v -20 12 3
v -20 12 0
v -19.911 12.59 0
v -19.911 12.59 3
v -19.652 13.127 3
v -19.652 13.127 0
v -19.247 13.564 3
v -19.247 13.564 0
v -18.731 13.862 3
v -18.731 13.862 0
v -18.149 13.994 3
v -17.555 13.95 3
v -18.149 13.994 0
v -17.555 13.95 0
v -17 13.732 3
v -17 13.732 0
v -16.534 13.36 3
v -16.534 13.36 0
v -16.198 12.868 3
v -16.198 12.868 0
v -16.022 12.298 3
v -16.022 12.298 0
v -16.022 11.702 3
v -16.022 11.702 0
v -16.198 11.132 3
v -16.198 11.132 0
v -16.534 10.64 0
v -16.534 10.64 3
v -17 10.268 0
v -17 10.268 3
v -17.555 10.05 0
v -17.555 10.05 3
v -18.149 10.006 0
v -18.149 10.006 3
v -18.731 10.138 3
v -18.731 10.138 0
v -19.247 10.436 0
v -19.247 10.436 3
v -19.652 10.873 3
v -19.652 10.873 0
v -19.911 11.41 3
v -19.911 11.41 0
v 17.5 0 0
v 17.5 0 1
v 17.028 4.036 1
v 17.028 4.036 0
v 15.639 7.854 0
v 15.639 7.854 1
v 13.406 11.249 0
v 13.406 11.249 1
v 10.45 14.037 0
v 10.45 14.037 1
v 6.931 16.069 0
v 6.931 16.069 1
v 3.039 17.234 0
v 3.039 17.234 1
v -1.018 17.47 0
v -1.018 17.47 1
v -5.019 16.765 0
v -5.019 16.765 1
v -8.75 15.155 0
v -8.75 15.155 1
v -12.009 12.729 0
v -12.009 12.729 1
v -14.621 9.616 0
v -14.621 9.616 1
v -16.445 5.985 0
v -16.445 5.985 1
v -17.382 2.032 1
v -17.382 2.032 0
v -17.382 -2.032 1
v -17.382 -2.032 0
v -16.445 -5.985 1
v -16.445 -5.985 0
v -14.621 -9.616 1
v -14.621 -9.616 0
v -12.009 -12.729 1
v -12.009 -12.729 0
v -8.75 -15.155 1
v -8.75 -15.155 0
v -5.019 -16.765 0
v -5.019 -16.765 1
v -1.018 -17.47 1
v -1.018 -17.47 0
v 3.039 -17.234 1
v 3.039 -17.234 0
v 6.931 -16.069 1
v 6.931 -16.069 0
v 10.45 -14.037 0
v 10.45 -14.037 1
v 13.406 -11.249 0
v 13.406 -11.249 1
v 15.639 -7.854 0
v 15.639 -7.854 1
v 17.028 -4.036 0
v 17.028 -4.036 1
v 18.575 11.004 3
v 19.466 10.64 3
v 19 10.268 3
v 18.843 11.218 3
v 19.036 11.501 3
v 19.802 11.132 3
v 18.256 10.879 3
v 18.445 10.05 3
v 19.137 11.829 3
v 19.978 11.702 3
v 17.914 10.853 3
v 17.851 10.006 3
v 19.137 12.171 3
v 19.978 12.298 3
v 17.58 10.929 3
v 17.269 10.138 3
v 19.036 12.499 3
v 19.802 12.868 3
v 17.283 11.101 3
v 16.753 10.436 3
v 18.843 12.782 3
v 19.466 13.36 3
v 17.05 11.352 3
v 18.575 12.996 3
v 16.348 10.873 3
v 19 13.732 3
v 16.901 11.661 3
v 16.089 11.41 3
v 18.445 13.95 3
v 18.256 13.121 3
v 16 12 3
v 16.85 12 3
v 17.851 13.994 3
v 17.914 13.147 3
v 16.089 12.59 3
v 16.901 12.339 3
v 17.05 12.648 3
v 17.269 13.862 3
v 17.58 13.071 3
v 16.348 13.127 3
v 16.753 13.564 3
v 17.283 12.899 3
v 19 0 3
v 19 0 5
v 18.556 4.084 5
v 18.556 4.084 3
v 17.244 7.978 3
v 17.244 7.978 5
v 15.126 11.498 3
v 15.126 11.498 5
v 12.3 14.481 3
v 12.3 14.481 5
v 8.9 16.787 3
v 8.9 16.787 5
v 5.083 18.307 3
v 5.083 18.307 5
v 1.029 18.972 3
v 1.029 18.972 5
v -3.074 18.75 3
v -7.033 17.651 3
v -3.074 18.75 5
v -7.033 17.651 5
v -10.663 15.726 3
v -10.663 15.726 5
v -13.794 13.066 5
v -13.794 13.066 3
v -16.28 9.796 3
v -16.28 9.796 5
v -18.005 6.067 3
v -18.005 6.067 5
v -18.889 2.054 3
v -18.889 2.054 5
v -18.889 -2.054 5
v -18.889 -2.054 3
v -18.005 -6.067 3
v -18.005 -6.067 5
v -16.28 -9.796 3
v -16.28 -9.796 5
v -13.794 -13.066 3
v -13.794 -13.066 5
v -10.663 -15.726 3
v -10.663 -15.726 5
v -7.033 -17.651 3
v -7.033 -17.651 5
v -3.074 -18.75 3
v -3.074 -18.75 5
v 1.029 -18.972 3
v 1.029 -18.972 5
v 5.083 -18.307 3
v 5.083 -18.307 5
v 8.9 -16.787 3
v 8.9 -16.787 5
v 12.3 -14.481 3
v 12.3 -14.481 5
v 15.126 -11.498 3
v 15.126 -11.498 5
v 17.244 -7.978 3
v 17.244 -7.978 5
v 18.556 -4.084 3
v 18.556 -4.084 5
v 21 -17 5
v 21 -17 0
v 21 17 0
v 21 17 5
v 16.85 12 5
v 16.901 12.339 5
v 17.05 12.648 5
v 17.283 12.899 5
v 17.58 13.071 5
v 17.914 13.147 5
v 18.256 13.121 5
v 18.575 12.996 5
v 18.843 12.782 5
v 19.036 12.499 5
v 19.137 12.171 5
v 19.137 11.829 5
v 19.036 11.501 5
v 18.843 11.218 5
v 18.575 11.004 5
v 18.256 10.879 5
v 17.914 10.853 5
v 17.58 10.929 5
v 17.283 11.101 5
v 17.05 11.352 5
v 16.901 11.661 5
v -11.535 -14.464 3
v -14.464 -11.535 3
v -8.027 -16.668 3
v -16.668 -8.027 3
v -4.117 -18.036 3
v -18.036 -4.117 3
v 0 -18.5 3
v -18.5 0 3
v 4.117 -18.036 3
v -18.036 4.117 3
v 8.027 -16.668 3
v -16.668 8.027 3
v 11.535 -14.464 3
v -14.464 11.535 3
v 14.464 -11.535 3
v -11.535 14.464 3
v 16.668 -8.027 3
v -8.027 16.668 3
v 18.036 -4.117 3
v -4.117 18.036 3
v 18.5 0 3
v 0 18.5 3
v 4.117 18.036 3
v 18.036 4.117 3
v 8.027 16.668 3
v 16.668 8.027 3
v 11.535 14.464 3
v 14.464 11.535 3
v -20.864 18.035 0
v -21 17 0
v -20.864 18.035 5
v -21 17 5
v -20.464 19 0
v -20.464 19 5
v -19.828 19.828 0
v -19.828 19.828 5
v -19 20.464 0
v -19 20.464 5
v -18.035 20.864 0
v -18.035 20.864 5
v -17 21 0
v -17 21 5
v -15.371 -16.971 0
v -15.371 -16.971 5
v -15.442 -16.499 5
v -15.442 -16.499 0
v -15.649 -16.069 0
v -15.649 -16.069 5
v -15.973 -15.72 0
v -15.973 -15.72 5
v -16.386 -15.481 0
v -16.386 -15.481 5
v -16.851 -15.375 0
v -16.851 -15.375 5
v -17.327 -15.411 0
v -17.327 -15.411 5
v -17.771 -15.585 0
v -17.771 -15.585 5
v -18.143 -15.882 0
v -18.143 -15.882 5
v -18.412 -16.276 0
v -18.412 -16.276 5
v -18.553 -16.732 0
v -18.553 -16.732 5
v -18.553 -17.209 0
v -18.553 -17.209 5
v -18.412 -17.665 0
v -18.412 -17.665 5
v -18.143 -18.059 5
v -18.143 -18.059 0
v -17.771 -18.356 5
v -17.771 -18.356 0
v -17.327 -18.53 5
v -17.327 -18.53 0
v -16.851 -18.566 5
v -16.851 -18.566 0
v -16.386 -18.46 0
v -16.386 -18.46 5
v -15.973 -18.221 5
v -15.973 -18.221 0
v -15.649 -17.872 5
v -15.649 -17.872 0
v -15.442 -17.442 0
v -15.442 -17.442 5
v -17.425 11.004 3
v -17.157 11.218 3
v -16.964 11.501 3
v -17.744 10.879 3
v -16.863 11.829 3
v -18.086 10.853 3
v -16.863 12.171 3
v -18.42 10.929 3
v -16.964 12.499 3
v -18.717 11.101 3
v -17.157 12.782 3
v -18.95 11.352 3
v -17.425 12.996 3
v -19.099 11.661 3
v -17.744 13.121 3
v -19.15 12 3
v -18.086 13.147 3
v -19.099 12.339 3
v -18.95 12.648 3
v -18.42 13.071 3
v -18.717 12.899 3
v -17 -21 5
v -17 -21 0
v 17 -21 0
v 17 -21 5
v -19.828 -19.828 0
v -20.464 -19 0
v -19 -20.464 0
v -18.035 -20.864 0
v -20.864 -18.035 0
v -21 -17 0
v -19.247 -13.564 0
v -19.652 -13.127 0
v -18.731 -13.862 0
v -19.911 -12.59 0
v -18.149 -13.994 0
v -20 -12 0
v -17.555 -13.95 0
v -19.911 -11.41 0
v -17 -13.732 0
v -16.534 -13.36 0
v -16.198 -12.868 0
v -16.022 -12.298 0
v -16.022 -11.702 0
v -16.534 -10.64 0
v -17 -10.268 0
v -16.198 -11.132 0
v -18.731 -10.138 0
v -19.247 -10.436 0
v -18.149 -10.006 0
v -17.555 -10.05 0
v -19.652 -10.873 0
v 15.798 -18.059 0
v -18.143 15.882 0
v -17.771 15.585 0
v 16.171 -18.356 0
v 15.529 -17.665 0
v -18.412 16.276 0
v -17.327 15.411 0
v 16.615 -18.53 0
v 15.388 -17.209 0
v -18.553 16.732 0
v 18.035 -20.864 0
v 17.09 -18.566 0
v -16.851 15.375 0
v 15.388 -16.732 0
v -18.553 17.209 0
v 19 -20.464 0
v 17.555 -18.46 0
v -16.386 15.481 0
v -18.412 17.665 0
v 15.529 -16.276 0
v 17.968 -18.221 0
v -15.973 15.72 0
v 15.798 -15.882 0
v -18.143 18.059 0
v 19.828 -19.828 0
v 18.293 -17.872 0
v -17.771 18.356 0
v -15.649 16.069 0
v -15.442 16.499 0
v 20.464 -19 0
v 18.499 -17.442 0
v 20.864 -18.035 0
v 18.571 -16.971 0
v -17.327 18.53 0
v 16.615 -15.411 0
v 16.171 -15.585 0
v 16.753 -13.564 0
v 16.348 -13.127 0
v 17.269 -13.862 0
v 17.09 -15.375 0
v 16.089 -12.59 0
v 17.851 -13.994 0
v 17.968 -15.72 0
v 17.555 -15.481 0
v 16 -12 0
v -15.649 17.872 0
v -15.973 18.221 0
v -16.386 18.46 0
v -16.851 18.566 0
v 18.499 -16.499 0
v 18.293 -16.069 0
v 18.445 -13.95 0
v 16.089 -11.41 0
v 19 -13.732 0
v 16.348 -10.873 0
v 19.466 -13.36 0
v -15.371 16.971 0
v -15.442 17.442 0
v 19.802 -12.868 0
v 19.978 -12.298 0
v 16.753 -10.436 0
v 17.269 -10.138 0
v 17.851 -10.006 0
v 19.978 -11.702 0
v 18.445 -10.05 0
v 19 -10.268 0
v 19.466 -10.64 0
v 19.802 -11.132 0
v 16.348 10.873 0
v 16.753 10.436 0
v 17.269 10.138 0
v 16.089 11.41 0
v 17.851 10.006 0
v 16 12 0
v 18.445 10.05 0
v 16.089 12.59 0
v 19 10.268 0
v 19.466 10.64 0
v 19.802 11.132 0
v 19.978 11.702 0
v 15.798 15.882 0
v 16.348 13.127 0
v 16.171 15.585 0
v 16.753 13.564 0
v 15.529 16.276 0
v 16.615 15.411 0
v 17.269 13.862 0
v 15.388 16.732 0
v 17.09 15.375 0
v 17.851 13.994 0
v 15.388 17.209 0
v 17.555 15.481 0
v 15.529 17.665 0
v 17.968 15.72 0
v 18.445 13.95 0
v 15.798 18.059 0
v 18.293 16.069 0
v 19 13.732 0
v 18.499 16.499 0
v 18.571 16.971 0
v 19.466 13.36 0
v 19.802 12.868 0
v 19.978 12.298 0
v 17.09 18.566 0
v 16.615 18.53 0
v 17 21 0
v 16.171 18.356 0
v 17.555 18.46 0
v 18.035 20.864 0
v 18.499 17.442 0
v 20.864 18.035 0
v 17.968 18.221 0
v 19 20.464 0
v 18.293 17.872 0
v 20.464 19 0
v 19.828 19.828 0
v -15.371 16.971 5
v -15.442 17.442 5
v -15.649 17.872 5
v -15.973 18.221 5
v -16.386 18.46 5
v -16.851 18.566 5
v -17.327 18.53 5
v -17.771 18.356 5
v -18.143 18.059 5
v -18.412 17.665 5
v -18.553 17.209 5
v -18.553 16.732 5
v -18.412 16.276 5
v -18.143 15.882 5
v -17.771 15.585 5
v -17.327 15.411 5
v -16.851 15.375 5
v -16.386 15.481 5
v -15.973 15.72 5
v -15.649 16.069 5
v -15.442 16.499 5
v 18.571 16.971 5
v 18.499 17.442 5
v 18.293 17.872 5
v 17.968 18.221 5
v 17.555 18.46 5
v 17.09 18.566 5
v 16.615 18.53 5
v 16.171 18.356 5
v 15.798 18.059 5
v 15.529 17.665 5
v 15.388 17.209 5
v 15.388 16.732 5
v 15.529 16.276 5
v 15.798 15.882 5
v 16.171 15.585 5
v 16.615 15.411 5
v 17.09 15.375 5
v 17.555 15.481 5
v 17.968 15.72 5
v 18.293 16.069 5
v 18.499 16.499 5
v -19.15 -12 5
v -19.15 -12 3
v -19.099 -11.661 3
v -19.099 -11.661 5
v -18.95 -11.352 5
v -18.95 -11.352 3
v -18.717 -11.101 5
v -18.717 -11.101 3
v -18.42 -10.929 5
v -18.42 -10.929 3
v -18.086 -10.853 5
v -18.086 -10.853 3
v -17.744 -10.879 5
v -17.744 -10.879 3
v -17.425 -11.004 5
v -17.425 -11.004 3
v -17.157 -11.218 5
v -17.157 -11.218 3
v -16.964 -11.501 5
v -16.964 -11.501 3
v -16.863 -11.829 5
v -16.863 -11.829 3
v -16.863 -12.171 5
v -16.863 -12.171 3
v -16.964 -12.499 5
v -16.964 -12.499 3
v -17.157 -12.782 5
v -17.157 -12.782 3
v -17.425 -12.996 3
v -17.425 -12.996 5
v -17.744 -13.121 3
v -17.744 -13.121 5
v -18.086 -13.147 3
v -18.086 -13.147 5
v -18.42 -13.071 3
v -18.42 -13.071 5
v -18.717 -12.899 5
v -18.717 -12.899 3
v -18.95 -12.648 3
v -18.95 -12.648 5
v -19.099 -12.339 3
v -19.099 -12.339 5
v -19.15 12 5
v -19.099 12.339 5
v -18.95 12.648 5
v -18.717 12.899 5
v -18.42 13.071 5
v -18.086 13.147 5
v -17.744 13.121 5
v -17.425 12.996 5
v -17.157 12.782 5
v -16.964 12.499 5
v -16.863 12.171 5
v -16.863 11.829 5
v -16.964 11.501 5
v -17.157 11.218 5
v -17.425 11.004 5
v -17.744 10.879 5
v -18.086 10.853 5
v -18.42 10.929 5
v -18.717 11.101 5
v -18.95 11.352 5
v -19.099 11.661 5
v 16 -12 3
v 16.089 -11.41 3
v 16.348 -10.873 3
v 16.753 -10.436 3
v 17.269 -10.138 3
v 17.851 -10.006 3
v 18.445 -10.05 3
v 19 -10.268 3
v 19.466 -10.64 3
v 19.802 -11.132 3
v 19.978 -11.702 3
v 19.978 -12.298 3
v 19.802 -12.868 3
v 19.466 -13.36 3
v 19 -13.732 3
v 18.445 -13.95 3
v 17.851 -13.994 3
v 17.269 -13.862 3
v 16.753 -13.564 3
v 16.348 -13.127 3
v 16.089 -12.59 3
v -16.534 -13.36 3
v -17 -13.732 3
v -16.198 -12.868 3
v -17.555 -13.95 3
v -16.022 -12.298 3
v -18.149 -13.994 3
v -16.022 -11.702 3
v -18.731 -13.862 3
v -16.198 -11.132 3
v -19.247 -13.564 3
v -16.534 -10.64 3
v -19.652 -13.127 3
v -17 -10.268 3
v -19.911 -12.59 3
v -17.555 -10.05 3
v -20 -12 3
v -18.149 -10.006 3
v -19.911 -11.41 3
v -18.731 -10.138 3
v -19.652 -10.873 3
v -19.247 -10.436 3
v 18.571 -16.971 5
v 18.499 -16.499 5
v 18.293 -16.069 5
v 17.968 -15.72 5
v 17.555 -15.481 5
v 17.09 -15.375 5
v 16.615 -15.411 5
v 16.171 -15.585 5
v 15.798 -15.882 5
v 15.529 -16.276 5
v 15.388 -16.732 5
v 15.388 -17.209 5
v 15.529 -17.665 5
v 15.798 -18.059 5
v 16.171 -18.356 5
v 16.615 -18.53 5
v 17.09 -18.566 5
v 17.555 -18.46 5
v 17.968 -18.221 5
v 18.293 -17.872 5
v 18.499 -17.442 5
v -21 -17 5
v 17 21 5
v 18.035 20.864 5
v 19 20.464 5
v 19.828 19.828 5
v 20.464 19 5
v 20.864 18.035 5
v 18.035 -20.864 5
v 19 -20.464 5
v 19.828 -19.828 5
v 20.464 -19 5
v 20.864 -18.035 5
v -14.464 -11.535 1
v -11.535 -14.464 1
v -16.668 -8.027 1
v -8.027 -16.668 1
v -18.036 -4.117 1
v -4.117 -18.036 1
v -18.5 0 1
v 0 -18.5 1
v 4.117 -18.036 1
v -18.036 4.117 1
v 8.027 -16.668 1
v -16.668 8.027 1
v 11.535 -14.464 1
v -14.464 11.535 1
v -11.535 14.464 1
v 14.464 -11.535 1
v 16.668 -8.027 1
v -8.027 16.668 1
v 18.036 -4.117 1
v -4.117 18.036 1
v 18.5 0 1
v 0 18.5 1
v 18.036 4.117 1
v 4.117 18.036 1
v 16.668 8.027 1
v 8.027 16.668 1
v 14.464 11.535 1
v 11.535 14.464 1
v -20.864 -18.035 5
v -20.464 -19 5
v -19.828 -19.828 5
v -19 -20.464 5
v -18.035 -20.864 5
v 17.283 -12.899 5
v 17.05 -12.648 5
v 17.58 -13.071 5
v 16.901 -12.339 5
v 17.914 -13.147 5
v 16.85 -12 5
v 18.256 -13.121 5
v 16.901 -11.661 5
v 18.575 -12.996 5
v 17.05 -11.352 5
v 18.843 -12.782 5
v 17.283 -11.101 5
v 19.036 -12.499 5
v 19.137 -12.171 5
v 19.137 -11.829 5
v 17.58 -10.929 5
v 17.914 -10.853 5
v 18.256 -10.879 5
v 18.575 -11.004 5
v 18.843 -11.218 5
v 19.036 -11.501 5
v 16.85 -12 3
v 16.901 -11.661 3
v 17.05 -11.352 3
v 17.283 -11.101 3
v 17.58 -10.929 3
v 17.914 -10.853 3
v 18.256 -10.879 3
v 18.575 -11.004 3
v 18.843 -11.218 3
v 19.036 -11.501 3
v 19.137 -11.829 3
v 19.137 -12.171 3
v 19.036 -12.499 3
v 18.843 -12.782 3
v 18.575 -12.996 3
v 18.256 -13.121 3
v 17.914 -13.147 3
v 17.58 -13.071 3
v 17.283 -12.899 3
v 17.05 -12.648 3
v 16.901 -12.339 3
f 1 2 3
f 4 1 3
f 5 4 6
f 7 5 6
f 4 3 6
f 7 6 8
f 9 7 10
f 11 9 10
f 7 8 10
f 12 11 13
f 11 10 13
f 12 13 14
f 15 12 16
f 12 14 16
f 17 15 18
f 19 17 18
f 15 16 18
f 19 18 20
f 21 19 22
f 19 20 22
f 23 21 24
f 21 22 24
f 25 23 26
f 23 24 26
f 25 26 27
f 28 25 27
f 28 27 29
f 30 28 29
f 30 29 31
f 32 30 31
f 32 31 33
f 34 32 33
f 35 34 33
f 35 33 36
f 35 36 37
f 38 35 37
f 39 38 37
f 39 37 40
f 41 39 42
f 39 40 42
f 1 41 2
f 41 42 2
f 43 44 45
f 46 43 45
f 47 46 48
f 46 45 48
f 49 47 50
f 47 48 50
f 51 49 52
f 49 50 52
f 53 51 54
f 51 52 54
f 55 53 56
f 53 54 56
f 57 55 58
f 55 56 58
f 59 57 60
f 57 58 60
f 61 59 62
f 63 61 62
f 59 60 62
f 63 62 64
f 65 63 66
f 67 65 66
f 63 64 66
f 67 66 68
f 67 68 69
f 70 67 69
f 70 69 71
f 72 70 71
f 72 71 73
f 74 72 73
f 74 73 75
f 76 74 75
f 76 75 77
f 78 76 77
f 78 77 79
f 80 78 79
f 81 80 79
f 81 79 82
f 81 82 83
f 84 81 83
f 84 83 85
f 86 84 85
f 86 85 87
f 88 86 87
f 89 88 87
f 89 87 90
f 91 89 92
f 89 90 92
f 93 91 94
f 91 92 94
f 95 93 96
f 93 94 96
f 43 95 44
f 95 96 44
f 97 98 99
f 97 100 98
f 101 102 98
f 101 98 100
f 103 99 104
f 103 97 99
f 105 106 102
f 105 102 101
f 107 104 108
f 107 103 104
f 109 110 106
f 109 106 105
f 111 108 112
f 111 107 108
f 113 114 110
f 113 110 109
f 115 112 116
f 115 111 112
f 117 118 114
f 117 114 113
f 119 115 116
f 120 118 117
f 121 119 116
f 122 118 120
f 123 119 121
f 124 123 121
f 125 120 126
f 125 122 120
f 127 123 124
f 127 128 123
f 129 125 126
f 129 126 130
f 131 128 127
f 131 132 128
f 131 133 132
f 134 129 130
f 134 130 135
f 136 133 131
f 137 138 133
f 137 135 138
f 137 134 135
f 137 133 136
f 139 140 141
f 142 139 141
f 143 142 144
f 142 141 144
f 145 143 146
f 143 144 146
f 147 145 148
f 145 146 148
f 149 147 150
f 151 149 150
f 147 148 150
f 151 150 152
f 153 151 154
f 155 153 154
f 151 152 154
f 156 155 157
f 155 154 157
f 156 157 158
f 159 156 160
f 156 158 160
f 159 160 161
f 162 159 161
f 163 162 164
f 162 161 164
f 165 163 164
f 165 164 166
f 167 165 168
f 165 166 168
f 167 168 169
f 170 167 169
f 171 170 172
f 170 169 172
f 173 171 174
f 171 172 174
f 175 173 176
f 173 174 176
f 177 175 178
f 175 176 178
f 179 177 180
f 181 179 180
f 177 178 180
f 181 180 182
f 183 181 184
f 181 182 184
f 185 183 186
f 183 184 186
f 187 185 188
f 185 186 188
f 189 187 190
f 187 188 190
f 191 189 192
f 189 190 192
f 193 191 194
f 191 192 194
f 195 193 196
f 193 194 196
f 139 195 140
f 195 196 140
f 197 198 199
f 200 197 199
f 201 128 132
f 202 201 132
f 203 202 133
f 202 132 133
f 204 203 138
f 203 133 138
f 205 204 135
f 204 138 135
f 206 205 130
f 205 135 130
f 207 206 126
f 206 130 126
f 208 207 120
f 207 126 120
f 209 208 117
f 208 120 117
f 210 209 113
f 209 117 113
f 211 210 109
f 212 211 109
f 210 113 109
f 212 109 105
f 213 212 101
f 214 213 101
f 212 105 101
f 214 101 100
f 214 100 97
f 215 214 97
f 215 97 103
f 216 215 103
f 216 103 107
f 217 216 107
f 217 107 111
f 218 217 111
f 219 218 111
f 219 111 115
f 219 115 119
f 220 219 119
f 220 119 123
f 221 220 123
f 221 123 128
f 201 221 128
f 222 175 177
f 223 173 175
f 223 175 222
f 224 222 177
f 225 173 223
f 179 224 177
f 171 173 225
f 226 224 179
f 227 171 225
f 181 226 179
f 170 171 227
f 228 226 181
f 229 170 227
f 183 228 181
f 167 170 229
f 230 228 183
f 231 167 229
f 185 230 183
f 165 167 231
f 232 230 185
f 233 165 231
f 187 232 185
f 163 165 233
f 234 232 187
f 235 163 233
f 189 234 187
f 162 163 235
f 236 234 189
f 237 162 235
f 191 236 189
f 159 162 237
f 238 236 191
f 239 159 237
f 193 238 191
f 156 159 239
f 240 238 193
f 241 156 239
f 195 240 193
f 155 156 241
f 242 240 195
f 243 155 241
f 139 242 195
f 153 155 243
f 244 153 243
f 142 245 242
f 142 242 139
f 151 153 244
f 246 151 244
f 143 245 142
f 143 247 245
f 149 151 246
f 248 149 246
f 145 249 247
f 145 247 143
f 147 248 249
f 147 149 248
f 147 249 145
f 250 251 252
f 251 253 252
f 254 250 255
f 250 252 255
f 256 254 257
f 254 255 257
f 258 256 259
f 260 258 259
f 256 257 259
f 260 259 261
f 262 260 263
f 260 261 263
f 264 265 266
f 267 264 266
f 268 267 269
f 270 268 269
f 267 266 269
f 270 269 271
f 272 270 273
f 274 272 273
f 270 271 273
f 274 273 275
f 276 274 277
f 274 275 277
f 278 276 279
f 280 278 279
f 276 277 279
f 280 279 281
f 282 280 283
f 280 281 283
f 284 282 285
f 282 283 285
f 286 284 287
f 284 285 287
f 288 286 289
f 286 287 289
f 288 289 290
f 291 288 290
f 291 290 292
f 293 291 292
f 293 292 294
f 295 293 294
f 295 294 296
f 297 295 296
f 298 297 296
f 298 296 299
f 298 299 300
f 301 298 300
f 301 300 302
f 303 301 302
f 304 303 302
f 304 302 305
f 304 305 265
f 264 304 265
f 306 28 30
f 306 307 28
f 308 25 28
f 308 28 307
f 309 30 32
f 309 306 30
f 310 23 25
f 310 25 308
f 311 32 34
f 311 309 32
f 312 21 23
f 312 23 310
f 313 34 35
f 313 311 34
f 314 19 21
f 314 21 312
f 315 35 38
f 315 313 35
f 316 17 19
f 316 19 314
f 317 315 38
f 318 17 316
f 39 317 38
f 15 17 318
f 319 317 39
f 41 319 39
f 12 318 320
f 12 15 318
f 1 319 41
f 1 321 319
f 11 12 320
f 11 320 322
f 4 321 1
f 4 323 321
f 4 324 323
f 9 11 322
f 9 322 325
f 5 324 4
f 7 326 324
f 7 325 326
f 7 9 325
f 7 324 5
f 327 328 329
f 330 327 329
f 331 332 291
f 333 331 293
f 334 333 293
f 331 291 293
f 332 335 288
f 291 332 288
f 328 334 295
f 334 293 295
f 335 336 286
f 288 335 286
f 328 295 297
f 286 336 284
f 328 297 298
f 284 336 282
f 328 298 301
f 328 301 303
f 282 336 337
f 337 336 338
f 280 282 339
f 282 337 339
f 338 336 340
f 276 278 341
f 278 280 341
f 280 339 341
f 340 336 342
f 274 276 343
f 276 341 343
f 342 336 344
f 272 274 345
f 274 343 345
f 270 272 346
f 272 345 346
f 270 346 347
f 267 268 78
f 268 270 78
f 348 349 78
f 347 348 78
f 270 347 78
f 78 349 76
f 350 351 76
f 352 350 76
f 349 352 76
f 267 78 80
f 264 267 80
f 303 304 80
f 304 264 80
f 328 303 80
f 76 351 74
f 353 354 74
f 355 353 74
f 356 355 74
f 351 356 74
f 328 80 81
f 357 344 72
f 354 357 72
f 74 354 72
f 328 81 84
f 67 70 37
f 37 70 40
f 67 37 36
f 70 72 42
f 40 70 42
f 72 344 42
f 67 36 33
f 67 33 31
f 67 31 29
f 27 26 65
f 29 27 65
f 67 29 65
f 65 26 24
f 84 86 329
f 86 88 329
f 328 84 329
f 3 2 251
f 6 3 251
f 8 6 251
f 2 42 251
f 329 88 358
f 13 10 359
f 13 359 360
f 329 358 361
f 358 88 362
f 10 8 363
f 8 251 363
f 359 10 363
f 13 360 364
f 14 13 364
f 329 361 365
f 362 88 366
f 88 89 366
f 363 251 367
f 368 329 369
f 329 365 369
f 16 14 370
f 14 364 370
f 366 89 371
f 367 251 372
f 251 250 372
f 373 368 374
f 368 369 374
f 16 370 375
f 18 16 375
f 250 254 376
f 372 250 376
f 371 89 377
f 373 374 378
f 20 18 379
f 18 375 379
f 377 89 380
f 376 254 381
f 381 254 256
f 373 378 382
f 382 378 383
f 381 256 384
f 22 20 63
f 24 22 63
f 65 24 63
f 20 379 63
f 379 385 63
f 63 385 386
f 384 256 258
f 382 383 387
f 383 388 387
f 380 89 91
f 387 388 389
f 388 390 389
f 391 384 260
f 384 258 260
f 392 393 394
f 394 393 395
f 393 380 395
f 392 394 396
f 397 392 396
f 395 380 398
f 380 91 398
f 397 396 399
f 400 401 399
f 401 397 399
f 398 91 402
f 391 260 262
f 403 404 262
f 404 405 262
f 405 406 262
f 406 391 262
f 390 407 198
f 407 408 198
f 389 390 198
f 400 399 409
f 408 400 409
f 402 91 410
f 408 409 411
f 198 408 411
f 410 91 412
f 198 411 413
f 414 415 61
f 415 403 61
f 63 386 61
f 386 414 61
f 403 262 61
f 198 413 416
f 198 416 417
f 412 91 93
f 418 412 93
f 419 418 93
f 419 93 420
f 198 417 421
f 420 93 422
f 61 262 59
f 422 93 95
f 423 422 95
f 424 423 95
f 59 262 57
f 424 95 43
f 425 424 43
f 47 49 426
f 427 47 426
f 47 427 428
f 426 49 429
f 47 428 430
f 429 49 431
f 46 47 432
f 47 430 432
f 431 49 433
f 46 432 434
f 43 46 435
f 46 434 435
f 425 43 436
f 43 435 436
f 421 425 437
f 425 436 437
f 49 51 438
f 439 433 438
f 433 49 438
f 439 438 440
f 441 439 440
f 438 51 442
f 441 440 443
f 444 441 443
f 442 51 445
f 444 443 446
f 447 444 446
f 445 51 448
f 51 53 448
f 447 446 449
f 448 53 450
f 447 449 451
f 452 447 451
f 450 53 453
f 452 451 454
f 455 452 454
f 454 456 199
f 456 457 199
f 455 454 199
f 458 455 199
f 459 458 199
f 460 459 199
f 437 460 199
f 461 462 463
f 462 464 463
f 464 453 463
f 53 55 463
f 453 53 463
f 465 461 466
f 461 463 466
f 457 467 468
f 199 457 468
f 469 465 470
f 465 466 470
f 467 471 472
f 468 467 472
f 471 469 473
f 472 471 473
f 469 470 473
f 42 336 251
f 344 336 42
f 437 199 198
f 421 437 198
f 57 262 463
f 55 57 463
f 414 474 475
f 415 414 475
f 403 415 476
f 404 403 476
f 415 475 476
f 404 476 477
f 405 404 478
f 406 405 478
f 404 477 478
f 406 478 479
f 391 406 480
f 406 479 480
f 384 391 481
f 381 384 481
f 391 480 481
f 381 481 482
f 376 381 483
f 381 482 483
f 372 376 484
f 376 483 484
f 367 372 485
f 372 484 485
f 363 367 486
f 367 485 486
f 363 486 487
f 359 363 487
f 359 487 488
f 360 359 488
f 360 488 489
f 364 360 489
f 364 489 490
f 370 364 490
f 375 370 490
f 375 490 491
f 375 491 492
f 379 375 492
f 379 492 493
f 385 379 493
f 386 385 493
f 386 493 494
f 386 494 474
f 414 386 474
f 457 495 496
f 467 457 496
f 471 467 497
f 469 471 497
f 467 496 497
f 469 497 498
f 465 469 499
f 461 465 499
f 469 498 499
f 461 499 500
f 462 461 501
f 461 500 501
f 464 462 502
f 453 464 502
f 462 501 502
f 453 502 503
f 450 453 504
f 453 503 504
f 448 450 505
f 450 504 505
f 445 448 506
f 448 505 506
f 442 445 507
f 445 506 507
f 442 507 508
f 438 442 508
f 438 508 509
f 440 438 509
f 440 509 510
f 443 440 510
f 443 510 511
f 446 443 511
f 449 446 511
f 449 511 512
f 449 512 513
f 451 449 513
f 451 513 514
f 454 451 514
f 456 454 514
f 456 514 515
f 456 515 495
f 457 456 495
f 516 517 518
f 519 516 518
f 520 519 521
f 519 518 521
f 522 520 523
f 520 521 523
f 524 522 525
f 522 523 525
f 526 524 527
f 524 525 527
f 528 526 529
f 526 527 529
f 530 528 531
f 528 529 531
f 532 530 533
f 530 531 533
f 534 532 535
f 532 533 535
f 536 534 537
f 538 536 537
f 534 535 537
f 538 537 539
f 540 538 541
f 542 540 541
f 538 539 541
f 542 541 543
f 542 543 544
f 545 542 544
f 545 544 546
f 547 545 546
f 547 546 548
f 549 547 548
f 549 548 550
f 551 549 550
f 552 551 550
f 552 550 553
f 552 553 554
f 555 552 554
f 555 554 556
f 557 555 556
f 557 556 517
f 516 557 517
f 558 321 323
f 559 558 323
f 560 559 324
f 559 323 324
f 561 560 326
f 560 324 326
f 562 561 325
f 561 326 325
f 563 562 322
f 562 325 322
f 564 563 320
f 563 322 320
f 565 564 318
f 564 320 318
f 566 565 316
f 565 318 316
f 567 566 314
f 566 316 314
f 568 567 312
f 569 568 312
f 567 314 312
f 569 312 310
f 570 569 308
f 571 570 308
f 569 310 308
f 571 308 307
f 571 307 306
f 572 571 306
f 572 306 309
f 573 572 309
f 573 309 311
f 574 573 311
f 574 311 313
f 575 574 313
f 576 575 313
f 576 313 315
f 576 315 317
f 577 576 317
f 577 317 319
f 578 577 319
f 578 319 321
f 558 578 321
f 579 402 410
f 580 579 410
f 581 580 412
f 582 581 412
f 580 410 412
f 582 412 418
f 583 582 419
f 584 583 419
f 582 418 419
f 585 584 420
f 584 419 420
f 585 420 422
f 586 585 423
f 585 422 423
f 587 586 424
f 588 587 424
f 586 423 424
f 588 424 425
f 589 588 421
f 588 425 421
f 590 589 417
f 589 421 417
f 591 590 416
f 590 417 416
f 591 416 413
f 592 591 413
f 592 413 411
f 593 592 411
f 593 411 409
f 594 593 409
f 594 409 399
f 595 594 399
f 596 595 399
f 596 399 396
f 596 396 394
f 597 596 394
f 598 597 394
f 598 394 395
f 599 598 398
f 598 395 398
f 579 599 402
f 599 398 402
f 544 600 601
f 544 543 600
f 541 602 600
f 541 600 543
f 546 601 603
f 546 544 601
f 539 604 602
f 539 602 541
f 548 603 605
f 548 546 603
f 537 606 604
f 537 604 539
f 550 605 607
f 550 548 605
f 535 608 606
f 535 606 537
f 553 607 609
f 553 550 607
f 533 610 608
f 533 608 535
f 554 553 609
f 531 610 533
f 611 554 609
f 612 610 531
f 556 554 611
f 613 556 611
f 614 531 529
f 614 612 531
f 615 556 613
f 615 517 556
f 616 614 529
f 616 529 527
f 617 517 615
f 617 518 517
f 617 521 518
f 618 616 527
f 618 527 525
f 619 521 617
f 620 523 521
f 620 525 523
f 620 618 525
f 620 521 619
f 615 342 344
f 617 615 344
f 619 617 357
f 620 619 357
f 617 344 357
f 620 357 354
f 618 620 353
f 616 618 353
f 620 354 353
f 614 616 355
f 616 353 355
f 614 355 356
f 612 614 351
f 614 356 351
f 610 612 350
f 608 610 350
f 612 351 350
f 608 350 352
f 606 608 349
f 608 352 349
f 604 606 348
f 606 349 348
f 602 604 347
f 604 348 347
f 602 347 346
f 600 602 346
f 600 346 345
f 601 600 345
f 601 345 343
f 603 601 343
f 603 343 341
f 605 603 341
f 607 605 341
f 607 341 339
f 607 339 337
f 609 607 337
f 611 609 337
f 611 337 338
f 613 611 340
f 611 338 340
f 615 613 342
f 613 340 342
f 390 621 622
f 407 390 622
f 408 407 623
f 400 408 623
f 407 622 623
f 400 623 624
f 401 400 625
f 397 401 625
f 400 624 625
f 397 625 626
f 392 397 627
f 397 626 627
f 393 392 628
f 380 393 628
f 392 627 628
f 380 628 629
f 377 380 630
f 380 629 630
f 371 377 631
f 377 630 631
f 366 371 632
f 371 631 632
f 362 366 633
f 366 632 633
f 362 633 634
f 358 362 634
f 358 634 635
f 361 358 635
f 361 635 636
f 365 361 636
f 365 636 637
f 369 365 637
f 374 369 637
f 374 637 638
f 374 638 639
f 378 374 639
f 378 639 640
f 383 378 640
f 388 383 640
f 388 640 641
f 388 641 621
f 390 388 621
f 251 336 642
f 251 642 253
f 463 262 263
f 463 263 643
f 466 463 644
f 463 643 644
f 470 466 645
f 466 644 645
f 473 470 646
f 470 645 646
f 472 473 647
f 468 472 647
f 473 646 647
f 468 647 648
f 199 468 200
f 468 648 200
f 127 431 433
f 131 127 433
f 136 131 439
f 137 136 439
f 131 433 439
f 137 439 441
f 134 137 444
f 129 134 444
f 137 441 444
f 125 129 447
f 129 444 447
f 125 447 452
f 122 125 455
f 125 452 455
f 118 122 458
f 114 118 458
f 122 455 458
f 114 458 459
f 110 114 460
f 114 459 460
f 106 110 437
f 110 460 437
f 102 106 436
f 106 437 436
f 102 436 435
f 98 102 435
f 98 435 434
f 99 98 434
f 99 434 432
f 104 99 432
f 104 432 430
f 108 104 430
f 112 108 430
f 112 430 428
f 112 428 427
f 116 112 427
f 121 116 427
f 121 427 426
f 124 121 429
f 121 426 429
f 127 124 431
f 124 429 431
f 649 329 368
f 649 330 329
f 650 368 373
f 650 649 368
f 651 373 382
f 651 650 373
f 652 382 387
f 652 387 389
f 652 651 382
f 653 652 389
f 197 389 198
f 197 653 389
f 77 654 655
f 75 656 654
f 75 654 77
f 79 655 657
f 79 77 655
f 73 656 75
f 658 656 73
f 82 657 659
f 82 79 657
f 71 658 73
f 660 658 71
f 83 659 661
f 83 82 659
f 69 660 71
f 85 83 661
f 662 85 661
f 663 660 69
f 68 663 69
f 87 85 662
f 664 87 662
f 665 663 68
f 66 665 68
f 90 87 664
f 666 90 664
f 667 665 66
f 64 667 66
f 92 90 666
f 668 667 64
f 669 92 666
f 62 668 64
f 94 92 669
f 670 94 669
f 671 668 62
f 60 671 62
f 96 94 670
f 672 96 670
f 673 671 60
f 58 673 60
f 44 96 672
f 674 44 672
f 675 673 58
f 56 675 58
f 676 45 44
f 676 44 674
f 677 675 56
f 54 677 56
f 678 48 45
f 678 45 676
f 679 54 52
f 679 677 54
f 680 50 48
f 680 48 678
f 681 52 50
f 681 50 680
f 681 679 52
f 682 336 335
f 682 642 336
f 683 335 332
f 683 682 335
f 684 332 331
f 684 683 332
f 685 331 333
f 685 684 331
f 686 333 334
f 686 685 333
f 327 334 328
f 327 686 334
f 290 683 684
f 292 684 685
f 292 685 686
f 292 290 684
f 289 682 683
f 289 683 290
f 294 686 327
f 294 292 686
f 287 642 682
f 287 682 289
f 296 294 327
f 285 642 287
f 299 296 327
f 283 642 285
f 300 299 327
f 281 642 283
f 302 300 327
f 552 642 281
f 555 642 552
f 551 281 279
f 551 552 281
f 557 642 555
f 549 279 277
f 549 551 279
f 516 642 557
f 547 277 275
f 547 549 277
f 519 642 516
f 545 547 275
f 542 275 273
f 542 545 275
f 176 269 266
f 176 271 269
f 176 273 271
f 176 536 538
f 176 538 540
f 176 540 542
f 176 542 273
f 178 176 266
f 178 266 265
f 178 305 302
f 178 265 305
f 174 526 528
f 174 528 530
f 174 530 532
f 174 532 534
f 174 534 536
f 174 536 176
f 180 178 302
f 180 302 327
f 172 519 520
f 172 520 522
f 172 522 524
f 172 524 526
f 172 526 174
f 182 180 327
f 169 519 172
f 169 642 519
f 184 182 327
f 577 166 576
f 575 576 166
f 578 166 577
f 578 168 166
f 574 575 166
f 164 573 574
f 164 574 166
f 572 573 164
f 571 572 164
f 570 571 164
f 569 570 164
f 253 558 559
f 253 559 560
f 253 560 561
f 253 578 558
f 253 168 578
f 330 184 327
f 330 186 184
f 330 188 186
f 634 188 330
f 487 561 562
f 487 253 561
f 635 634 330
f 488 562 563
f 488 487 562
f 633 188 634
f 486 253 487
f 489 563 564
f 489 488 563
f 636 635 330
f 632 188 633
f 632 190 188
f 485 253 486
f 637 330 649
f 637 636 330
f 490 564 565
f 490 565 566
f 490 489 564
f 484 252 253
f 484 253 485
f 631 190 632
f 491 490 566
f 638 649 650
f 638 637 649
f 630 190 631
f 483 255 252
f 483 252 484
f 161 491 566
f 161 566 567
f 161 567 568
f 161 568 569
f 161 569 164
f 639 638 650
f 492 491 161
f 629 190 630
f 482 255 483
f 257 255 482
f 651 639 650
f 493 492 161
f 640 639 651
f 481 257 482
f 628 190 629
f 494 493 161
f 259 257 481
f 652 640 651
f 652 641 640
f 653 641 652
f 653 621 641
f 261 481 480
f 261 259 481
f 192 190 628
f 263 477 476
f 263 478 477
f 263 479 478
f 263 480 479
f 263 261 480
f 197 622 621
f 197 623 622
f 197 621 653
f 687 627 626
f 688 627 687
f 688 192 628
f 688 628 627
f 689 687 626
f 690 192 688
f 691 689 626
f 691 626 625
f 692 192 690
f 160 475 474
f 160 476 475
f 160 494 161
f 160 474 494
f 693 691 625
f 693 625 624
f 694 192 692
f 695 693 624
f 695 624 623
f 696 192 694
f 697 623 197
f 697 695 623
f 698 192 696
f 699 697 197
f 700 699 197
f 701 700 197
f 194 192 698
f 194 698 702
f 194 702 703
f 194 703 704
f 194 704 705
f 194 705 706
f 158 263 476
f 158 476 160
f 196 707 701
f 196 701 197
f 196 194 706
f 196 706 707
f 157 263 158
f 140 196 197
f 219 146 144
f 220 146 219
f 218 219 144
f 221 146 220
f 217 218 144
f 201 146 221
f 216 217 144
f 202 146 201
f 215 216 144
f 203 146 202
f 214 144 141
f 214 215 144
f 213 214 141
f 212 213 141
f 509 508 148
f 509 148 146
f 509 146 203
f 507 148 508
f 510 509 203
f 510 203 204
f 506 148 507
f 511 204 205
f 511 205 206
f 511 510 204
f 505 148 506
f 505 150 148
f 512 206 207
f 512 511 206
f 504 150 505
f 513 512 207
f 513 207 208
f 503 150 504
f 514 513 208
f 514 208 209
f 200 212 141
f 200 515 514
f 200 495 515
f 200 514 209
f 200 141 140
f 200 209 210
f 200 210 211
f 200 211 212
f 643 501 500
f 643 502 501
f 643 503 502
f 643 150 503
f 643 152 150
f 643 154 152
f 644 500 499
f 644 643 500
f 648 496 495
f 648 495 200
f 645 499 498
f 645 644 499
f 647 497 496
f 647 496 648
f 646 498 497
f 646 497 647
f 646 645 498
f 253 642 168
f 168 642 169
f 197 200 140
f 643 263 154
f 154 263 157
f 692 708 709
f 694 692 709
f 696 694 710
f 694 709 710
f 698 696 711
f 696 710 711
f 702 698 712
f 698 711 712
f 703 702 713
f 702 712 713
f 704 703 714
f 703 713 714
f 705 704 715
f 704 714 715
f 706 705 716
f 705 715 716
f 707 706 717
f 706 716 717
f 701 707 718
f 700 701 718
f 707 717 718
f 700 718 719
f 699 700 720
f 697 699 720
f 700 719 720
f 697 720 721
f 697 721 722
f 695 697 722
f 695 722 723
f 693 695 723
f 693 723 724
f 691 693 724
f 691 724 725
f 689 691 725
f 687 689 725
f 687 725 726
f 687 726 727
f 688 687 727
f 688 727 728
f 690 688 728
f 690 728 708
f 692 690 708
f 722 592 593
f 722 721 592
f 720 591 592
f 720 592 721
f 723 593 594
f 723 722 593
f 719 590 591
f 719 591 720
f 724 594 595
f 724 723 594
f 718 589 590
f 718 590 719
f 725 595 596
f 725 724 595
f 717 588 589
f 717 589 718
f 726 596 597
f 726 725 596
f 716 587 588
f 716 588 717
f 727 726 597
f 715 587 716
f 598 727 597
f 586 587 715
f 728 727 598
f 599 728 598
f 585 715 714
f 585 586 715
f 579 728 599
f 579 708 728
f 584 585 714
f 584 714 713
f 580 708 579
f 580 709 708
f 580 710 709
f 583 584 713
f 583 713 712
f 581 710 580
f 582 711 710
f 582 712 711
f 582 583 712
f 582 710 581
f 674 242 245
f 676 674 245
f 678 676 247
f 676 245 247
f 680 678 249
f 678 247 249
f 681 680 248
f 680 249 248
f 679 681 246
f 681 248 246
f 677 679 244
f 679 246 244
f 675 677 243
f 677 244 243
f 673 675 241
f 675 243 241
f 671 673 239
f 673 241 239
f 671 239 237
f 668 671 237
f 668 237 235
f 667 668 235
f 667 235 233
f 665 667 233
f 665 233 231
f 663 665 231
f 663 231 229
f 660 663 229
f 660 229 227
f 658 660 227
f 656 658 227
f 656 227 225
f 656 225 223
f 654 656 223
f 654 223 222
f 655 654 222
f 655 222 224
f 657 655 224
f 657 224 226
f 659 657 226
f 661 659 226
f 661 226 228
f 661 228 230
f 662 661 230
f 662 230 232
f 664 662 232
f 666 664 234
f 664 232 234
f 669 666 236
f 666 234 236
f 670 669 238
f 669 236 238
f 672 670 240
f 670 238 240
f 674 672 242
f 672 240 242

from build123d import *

# Parameters (mm, degrees)
SKETCH_1_W          = 42
SKETCH_1_H          = 42
EXTRUDE_1_DEPTH     = 5
SKETCH_2_R          = 17.5
CUT_EXTRUDE_1_DEPTH = 6
SKETCH_3_R          = 18.5
CUT_EXTRUDE_2_DEPTH = 4
SKETCH_4_R          = 19
CUT_EXTRUDE_3_DEPTH = 2
FILLET_1_R          = 4
SKETCH_5_R          = 1.6
CUT_EXTRUDE_4_DEPTH = 6
SKETCH_7_R          = 1.15
CUT_EXTRUDE_5_DEPTH = 6
SKETCH_8_R          = 2
CUT_EXTRUDE_6_DEPTH = 3


with BuildPart() as part:
    # 草图1 → 凸台-拉伸1 (new body)
    with BuildSketch(Plane.XY):
        Rectangle(SKETCH_1_W, SKETCH_1_H)
    extrude(amount=EXTRUDE_1_DEPTH)

    # 草图2 → 切除-拉伸1 (cut, through all)
    with BuildSketch(Plane.XY.offset(5)):
        Circle(SKETCH_2_R)
    extrude(amount=-CUT_EXTRUDE_1_DEPTH, mode=Mode.SUBTRACT)

    # 草图3 → 切除-拉伸2 (cut)
    with BuildSketch(Plane.XY.offset(5)):
        Circle(SKETCH_3_R)
    extrude(amount=-CUT_EXTRUDE_2_DEPTH, mode=Mode.SUBTRACT)

    # 草图4 → 切除-拉伸3 (cut)
    with BuildSketch(Plane.XY.offset(5)):
        Circle(SKETCH_4_R)
    extrude(amount=-CUT_EXTRUDE_3_DEPTH, mode=Mode.SUBTRACT)

    # 圆角1
    fillet_1_edges = [part.edges().sort_by_distance(p)[0] for p in [
        (21, -21, 2.5),
        (-21, -21, 2.5),
        (-21, 21, 2.5),
        (21, 21, 2.5),
    ]]
    fillet(fillet_1_edges, radius=FILLET_1_R)

    # 草图5 → 切除-拉伸4 (cut, through all)
    with BuildSketch(Plane.XY.offset(5)):
        with Locations((-16.970562748, 16.970562748)):
            Circle(SKETCH_5_R)
        with Locations((16.970562748, 16.970562748)):
            Circle(SKETCH_5_R)
        with Locations((16.970562748, -16.970562748)):
            Circle(SKETCH_5_R)
        with Locations((-16.970562748, -16.970562748)):
            Circle(SKETCH_5_R)
    extrude(amount=-CUT_EXTRUDE_4_DEPTH, mode=Mode.SUBTRACT)

    # 草图7 → 切除-拉伸5 (cut, through all)
    with BuildSketch(Plane(origin=(0, 0, 0), x_dir=(-1, 0, 0), z_dir=(0, 0, -1))):
        with Locations((-18, 12)):
            Circle(SKETCH_7_R)
        with Locations((18, 12)):
            Circle(SKETCH_7_R)
        with Locations((18, -12)):
            Circle(SKETCH_7_R)
        with Locations((-18, -12)):
            Circle(SKETCH_7_R)
    extrude(amount=-CUT_EXTRUDE_5_DEPTH, mode=Mode.SUBTRACT)

    # 草图8 → 切除-拉伸6 (cut)
    with BuildSketch(Plane(origin=(0, 0, 0), x_dir=(-1, 0, 0), z_dir=(0, 0, -1))):
        with Locations((-18, 12)):
            Circle(SKETCH_8_R)
        with Locations((18, 12)):
            Circle(SKETCH_8_R)
        with Locations((18, -12)):
            Circle(SKETCH_8_R)
        with Locations((-18, -12)):
            Circle(SKETCH_8_R)
    extrude(amount=-CUT_EXTRUDE_6_DEPTH, mode=Mode.SUBTRACT)


solid = part.part
